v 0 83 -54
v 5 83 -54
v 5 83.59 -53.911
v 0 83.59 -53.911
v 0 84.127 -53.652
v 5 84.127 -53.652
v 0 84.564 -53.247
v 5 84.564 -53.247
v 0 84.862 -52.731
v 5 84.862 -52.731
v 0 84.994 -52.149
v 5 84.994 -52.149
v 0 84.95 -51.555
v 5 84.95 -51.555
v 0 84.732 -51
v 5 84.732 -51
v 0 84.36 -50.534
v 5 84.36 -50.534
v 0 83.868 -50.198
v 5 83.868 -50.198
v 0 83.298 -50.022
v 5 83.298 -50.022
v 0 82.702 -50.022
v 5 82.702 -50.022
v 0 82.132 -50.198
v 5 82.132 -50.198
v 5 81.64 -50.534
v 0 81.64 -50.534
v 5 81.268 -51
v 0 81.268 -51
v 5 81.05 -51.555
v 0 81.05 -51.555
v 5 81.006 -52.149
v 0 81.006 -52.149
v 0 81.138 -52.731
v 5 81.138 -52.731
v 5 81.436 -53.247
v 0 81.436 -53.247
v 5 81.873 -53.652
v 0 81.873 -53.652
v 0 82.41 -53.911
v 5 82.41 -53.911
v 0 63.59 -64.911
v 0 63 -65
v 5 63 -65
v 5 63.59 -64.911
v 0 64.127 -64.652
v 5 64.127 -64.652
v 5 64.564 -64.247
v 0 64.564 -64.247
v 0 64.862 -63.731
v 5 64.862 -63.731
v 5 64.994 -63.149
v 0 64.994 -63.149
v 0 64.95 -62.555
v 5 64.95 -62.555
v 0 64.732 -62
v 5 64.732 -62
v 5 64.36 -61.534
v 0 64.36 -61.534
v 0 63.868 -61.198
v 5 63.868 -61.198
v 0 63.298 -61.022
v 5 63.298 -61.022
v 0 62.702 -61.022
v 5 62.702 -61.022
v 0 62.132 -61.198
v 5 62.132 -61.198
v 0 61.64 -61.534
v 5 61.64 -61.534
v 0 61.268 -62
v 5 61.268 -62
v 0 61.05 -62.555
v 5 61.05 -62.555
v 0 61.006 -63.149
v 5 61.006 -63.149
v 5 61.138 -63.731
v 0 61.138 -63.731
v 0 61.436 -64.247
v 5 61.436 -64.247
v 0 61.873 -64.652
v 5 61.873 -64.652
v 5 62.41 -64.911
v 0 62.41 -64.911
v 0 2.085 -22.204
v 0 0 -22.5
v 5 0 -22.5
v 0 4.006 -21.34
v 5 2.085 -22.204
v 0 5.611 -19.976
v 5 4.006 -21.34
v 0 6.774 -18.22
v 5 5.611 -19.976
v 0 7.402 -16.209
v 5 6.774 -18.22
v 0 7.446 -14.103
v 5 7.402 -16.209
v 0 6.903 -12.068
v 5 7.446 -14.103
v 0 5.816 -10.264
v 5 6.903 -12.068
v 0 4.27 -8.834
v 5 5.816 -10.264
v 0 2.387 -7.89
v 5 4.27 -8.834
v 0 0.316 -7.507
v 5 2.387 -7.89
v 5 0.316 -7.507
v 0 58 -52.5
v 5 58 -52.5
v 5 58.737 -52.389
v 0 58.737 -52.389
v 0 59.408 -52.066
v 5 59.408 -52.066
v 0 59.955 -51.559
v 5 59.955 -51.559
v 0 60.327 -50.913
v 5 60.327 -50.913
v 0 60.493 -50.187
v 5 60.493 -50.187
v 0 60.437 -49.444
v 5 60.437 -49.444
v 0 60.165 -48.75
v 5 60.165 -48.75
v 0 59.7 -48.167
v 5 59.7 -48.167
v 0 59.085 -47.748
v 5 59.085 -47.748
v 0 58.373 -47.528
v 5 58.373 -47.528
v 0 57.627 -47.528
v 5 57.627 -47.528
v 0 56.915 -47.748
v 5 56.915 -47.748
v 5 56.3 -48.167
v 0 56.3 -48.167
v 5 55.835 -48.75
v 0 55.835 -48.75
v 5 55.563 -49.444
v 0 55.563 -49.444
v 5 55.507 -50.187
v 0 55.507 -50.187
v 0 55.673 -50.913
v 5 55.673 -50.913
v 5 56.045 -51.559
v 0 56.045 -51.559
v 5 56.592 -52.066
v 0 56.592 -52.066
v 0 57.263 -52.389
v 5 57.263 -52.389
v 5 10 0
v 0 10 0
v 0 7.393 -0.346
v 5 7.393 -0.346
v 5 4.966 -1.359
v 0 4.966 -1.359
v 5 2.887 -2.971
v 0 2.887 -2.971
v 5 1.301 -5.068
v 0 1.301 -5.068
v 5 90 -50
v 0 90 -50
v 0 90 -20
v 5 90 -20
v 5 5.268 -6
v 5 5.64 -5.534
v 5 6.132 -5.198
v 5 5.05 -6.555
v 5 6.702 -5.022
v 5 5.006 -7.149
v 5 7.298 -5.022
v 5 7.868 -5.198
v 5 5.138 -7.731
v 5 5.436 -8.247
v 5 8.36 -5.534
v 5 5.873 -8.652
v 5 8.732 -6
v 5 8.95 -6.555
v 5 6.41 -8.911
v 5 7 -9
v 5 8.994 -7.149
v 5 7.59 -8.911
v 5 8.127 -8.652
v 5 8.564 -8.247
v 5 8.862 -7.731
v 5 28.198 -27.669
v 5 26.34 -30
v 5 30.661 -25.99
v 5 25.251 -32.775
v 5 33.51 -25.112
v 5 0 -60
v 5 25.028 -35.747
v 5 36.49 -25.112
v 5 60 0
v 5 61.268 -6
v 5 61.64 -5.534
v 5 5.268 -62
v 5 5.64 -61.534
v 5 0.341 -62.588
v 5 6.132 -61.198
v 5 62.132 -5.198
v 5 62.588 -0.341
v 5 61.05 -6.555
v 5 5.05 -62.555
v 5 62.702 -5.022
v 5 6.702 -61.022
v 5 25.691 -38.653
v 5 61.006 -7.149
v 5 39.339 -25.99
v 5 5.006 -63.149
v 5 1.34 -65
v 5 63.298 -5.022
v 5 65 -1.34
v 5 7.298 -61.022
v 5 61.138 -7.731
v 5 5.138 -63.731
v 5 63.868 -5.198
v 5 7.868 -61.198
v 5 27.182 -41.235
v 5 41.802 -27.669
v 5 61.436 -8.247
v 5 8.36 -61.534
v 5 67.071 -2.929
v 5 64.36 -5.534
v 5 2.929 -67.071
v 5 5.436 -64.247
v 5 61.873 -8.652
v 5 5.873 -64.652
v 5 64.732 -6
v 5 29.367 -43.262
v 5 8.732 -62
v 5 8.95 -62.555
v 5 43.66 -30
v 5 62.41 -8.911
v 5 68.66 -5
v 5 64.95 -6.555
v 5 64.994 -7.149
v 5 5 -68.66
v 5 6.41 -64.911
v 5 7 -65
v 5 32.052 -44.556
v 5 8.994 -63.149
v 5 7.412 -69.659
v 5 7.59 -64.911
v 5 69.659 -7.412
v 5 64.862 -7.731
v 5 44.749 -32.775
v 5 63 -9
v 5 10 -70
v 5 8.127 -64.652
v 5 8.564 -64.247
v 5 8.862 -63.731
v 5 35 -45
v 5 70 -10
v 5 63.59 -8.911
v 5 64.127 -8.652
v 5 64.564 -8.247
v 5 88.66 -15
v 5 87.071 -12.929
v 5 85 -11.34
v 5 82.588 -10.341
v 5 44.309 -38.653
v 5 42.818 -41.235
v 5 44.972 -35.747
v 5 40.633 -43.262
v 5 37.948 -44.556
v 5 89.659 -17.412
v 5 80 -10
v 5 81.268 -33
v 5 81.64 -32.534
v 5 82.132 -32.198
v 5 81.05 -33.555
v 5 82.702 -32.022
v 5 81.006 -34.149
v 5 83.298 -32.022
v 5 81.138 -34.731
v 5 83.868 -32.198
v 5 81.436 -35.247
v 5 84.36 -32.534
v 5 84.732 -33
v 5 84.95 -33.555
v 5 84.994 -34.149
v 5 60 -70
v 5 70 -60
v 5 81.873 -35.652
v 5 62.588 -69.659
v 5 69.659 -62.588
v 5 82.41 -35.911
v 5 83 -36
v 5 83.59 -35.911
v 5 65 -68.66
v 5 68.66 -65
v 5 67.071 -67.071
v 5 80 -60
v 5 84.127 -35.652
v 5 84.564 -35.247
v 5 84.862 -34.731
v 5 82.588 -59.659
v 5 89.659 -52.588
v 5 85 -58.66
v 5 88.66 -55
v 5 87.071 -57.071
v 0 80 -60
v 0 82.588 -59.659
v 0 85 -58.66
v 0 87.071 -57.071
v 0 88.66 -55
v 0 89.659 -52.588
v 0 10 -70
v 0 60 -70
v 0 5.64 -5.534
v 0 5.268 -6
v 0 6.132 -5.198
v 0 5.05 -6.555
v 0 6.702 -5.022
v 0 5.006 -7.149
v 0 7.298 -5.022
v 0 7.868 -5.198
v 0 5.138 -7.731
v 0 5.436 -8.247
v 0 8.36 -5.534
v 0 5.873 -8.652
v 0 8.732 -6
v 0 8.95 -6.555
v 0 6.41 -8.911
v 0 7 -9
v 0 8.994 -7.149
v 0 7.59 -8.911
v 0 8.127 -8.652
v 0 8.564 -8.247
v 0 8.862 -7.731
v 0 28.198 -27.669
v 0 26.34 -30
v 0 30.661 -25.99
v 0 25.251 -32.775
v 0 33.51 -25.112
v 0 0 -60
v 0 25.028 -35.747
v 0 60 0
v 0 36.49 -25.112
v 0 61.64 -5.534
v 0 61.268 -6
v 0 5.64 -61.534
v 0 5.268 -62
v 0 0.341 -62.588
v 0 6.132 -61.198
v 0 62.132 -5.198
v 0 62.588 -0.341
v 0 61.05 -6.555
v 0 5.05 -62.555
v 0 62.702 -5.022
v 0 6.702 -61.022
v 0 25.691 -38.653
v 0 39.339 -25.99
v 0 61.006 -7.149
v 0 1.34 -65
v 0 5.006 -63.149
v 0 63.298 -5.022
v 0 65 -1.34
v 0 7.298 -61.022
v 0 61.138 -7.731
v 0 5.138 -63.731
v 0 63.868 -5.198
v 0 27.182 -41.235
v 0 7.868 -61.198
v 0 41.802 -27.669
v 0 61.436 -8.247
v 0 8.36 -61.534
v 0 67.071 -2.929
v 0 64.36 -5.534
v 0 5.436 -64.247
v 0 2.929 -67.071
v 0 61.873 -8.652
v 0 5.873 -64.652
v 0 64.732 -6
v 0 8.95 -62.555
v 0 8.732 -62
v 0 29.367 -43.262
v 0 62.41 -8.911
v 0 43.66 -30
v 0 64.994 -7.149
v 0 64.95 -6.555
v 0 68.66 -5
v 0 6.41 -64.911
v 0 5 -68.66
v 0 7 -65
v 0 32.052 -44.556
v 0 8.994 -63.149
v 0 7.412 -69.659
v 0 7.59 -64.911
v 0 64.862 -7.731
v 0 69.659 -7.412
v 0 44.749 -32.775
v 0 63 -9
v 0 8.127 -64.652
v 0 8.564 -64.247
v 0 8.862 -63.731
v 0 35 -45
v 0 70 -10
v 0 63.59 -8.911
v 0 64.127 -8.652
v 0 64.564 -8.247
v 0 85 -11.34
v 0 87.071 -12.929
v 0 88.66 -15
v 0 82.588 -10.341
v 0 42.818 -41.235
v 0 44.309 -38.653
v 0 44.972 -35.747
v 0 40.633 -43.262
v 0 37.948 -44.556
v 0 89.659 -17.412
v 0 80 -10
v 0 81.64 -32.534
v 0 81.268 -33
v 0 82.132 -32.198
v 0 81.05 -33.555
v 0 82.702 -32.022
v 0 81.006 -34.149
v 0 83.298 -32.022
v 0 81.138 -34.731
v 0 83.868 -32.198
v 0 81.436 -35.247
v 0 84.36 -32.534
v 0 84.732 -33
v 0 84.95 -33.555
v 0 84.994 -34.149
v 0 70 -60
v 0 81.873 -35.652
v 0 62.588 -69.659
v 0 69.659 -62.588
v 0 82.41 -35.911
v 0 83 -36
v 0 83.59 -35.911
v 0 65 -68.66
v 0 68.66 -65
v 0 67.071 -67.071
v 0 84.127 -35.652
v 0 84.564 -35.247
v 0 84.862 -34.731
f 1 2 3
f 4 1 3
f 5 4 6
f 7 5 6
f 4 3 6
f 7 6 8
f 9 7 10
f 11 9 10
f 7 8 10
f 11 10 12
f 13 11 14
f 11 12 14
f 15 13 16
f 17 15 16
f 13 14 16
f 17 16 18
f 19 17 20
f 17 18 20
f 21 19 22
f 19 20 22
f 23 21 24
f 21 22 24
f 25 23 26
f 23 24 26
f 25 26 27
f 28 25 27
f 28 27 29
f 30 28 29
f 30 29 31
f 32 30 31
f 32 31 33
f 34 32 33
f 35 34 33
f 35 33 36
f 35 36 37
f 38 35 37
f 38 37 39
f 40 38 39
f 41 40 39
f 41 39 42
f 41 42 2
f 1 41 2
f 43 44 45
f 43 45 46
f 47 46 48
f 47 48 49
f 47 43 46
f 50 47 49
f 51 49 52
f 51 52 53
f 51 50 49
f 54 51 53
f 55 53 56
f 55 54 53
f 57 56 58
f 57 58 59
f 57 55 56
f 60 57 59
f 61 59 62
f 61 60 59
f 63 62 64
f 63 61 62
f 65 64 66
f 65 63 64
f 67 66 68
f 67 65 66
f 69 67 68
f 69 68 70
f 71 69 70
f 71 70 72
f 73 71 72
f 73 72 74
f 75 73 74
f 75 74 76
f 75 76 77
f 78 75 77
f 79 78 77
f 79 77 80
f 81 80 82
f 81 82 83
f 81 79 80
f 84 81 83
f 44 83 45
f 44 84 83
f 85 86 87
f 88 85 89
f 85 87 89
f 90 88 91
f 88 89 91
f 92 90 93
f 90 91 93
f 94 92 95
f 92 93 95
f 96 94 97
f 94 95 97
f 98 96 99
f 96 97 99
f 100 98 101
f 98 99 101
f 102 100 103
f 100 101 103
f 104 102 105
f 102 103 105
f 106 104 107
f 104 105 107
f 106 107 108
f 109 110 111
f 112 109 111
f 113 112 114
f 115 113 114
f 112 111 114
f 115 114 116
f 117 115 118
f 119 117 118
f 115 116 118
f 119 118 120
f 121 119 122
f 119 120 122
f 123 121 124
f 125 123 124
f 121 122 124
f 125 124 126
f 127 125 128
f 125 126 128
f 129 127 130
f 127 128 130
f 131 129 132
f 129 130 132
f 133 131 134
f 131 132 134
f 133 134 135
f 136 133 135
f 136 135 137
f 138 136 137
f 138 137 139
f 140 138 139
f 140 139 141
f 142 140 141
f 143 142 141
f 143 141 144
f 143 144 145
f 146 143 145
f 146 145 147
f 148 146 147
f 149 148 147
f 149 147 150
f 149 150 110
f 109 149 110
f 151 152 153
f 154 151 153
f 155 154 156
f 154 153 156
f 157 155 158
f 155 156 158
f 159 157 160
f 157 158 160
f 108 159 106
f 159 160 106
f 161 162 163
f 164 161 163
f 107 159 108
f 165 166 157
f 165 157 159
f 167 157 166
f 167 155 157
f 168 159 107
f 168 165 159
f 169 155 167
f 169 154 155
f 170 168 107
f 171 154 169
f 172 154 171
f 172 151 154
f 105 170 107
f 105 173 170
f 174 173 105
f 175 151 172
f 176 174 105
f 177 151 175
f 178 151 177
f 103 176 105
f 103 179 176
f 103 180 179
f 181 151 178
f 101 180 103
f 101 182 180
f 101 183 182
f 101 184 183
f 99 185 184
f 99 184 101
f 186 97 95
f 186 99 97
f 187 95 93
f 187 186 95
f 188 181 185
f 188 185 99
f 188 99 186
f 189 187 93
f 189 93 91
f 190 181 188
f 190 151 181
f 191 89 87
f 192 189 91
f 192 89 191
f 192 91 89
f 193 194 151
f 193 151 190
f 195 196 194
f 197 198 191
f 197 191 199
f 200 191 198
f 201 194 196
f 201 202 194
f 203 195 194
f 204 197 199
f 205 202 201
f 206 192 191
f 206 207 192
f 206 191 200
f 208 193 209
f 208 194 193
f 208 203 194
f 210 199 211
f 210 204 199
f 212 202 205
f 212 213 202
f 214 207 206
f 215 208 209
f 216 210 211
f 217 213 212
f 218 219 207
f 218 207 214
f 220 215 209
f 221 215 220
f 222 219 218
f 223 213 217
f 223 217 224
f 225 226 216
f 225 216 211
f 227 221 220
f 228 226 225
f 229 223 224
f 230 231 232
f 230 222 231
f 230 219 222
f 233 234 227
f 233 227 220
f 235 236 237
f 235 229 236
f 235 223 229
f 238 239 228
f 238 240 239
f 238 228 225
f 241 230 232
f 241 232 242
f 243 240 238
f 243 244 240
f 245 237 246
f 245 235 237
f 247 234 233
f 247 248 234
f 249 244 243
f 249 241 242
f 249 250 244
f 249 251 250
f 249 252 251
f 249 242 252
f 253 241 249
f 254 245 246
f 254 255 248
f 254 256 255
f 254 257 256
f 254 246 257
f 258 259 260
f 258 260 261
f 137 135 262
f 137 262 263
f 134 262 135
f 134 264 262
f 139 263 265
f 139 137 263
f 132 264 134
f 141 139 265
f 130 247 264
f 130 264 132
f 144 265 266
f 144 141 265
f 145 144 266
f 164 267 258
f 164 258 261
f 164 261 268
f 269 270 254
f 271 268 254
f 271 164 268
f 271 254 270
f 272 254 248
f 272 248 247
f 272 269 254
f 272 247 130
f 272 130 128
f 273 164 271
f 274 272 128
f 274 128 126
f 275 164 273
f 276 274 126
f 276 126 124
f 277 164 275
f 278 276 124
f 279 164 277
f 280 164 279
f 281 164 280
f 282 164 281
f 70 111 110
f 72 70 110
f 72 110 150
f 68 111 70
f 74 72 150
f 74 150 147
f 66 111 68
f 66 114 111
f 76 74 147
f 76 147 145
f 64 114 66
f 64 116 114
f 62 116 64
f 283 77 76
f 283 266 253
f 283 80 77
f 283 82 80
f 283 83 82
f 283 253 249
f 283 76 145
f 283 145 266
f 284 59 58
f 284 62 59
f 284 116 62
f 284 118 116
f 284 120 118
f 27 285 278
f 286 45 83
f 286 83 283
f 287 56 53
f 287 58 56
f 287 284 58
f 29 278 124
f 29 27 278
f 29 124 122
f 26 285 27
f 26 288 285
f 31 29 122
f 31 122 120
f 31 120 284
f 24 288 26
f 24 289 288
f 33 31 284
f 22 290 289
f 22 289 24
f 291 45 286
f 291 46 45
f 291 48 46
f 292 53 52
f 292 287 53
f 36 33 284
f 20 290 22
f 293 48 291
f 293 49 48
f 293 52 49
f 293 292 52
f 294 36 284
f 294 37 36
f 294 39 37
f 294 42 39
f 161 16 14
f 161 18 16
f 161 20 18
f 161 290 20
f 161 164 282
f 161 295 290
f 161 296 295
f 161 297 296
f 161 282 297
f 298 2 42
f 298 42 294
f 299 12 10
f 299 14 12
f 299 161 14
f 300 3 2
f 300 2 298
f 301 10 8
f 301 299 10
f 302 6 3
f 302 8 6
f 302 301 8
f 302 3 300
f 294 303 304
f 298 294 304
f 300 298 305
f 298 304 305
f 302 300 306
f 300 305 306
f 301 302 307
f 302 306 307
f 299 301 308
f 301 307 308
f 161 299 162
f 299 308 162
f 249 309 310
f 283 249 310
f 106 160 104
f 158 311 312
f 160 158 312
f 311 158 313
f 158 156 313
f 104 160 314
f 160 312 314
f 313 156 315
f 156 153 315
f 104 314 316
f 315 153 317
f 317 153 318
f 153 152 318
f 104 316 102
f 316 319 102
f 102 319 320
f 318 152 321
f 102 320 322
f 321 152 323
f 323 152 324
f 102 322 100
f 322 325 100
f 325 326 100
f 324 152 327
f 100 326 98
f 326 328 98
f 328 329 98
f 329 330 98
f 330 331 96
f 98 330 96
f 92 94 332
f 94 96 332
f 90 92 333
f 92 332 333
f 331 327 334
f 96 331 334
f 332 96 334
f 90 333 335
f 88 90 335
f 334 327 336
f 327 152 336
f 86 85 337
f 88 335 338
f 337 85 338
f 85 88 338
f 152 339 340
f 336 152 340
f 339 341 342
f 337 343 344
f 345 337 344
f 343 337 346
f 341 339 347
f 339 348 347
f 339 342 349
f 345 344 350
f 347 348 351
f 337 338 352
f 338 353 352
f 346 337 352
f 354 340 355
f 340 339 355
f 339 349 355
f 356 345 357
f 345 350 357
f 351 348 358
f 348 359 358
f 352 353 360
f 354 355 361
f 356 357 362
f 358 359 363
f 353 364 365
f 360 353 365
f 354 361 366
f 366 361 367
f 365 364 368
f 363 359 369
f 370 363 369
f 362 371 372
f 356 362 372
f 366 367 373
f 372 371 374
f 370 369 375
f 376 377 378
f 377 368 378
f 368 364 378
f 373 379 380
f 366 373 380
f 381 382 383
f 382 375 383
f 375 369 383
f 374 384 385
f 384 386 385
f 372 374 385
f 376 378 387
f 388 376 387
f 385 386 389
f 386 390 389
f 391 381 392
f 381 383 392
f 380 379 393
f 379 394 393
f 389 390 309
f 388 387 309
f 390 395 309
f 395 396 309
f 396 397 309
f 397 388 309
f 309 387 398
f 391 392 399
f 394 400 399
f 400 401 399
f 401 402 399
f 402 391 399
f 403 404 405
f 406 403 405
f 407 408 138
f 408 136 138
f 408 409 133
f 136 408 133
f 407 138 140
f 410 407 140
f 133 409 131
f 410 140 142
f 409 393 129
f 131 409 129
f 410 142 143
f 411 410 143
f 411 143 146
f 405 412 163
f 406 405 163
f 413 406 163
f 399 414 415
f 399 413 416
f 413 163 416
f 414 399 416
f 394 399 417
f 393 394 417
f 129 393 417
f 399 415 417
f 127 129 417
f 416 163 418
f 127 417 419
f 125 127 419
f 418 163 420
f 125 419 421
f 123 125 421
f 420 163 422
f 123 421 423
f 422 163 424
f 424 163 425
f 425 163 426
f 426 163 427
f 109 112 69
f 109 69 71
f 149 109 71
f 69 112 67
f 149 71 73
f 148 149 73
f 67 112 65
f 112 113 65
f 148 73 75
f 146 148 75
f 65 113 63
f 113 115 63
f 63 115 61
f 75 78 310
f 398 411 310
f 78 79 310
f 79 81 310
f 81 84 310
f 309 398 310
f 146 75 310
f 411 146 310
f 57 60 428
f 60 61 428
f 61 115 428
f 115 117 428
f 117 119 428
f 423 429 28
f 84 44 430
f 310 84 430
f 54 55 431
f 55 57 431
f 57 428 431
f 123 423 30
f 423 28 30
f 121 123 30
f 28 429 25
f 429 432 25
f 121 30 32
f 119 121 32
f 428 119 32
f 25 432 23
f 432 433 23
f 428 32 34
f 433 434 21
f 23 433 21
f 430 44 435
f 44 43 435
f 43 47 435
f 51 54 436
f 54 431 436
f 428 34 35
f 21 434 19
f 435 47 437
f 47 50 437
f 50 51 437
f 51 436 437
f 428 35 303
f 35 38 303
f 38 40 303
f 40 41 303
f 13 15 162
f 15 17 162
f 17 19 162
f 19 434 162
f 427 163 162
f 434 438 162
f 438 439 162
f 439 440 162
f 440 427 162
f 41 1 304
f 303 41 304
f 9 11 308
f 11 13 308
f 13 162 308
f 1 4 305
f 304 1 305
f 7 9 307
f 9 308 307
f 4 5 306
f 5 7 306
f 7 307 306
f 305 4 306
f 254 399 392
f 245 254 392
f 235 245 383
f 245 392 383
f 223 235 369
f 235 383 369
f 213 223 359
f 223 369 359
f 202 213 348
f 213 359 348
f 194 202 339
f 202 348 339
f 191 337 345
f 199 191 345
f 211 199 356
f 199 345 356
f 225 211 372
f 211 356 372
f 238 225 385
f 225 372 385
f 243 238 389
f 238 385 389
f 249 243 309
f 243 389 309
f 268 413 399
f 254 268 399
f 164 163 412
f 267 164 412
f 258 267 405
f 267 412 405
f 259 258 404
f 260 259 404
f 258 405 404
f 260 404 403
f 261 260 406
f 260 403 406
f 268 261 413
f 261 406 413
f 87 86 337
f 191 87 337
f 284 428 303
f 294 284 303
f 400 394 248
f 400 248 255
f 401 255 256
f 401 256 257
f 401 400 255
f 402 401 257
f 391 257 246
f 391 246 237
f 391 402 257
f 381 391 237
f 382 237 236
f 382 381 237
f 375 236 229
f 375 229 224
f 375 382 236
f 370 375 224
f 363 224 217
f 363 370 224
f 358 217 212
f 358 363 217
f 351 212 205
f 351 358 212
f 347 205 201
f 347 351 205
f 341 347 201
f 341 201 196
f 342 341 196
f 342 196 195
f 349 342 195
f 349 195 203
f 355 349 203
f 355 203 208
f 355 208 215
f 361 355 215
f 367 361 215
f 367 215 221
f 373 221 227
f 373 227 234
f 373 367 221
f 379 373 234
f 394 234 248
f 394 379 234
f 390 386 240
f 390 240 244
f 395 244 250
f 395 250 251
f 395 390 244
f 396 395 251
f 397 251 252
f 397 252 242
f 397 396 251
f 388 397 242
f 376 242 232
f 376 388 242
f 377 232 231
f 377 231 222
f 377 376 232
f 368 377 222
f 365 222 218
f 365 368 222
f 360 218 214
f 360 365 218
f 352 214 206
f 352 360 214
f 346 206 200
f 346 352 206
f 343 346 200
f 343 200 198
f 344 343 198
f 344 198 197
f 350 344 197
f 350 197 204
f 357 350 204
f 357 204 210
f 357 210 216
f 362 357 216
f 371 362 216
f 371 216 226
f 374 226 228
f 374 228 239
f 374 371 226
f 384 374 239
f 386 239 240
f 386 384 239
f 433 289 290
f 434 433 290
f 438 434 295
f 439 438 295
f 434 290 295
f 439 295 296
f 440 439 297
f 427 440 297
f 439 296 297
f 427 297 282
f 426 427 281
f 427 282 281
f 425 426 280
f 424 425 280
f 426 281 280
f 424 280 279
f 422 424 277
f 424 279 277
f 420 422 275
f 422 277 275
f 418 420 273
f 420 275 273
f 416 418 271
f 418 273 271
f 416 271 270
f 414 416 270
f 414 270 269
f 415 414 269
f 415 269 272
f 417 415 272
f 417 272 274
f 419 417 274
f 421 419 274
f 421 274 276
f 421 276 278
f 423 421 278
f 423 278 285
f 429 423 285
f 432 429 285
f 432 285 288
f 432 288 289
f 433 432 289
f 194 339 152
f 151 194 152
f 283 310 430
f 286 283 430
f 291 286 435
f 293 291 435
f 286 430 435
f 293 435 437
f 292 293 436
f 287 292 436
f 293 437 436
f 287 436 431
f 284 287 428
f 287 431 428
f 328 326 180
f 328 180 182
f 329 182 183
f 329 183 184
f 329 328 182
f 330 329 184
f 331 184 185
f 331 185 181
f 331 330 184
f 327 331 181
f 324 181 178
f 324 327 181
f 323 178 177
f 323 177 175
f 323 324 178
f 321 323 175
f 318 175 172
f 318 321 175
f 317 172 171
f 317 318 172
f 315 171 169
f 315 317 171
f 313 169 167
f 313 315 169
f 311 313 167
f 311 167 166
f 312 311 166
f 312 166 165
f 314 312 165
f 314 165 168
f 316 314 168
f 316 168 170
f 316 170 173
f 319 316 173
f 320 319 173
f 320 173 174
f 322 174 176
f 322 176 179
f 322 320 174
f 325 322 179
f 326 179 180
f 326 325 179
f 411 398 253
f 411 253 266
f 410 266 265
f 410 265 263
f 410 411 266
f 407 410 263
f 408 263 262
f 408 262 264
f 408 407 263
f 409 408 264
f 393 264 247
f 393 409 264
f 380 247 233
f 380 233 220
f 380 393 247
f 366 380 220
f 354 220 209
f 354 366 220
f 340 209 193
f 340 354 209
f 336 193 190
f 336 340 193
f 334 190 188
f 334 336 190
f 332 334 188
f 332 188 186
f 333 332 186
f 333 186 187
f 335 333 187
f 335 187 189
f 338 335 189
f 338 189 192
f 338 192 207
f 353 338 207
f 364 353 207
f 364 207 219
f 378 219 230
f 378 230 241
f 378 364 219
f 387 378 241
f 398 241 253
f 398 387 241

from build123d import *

# Parameters (mm, degrees)
CROQUIS1_R              = 2
CROQUIS1_R_2            = 10
SALIENTE_EXTRUIR1_DEPTH = 5
CROQUIS2_R              = 7.5
CROQUIS2_R_2            = 2.5
CROQUIS2_R_3            = 2
CORTAR_EXTRUIR1_DEPTH   = 10


with BuildPart() as part:
    # Croquis1 → Saliente-Extruir1 (new body)
    with BuildSketch(Plane(origin=(0, 0, 0), x_dir=(0, 0, -1), z_dir=(1, 0, 0))):
        with BuildLine():
            Line((10, 0), (60, 0))
            ThreePointArc((60, 0), (67.071067812, 2.928932188), (70, 10))
            Line((70, 10), (70, 60))
            ThreePointArc((70, 60), (67.071067812, 67.071067812), (60, 70))
            Line((60, 70), (60, 80))
            ThreePointArc((60, 80), (57.071067812, 87.071067812), (50, 90))
            Line((50, 90), (20, 90))
            ThreePointArc((20, 90), (12.928932188, 87.071067812), (10, 80))
            Line((10, 80), (10, 70))
            ThreePointArc((10, 70), (2.928932188, 67.071067812), (0, 60))
            Line((0, 60), (0, 10))
            ThreePointArc((0, 10), (2.928932188, 2.928932188), (10, 0))
        make_face()
        with Locations((7, 63)):
            Circle(CROQUIS1_R, mode=Mode.SUBTRACT)
        with Locations((63, 63)):
            Circle(CROQUIS1_R, mode=Mode.SUBTRACT)
        with Locations((63, 7)):
            Circle(CROQUIS1_R, mode=Mode.SUBTRACT)
        with Locations((7, 7)):
            Circle(CROQUIS1_R, mode=Mode.SUBTRACT)
        with Locations((35, 35)):
            Circle(CROQUIS1_R_2, mode=Mode.SUBTRACT)
    extrude(amount=SALIENTE_EXTRUIR1_DEPTH)

    # Croquis2 → Cortar-Extruir1 (cut)
    with BuildSketch(Plane(origin=(5, 0, 0), x_dir=(0, 0, -1), z_dir=(1, 0, 0))):
        with Locations((15, 0)):
            Circle(CROQUIS2_R)
        with Locations((50, 58)):
            Circle(CROQUIS2_R_2)
        with Locations((52, 83)):
            Circle(CROQUIS2_R_3)
        with Locations((34, 83)):
            Circle(CROQUIS2_R_3)
    extrude(amount=-CORTAR_EXTRUIR1_DEPTH, mode=Mode.SUBTRACT)


solid = part.part
